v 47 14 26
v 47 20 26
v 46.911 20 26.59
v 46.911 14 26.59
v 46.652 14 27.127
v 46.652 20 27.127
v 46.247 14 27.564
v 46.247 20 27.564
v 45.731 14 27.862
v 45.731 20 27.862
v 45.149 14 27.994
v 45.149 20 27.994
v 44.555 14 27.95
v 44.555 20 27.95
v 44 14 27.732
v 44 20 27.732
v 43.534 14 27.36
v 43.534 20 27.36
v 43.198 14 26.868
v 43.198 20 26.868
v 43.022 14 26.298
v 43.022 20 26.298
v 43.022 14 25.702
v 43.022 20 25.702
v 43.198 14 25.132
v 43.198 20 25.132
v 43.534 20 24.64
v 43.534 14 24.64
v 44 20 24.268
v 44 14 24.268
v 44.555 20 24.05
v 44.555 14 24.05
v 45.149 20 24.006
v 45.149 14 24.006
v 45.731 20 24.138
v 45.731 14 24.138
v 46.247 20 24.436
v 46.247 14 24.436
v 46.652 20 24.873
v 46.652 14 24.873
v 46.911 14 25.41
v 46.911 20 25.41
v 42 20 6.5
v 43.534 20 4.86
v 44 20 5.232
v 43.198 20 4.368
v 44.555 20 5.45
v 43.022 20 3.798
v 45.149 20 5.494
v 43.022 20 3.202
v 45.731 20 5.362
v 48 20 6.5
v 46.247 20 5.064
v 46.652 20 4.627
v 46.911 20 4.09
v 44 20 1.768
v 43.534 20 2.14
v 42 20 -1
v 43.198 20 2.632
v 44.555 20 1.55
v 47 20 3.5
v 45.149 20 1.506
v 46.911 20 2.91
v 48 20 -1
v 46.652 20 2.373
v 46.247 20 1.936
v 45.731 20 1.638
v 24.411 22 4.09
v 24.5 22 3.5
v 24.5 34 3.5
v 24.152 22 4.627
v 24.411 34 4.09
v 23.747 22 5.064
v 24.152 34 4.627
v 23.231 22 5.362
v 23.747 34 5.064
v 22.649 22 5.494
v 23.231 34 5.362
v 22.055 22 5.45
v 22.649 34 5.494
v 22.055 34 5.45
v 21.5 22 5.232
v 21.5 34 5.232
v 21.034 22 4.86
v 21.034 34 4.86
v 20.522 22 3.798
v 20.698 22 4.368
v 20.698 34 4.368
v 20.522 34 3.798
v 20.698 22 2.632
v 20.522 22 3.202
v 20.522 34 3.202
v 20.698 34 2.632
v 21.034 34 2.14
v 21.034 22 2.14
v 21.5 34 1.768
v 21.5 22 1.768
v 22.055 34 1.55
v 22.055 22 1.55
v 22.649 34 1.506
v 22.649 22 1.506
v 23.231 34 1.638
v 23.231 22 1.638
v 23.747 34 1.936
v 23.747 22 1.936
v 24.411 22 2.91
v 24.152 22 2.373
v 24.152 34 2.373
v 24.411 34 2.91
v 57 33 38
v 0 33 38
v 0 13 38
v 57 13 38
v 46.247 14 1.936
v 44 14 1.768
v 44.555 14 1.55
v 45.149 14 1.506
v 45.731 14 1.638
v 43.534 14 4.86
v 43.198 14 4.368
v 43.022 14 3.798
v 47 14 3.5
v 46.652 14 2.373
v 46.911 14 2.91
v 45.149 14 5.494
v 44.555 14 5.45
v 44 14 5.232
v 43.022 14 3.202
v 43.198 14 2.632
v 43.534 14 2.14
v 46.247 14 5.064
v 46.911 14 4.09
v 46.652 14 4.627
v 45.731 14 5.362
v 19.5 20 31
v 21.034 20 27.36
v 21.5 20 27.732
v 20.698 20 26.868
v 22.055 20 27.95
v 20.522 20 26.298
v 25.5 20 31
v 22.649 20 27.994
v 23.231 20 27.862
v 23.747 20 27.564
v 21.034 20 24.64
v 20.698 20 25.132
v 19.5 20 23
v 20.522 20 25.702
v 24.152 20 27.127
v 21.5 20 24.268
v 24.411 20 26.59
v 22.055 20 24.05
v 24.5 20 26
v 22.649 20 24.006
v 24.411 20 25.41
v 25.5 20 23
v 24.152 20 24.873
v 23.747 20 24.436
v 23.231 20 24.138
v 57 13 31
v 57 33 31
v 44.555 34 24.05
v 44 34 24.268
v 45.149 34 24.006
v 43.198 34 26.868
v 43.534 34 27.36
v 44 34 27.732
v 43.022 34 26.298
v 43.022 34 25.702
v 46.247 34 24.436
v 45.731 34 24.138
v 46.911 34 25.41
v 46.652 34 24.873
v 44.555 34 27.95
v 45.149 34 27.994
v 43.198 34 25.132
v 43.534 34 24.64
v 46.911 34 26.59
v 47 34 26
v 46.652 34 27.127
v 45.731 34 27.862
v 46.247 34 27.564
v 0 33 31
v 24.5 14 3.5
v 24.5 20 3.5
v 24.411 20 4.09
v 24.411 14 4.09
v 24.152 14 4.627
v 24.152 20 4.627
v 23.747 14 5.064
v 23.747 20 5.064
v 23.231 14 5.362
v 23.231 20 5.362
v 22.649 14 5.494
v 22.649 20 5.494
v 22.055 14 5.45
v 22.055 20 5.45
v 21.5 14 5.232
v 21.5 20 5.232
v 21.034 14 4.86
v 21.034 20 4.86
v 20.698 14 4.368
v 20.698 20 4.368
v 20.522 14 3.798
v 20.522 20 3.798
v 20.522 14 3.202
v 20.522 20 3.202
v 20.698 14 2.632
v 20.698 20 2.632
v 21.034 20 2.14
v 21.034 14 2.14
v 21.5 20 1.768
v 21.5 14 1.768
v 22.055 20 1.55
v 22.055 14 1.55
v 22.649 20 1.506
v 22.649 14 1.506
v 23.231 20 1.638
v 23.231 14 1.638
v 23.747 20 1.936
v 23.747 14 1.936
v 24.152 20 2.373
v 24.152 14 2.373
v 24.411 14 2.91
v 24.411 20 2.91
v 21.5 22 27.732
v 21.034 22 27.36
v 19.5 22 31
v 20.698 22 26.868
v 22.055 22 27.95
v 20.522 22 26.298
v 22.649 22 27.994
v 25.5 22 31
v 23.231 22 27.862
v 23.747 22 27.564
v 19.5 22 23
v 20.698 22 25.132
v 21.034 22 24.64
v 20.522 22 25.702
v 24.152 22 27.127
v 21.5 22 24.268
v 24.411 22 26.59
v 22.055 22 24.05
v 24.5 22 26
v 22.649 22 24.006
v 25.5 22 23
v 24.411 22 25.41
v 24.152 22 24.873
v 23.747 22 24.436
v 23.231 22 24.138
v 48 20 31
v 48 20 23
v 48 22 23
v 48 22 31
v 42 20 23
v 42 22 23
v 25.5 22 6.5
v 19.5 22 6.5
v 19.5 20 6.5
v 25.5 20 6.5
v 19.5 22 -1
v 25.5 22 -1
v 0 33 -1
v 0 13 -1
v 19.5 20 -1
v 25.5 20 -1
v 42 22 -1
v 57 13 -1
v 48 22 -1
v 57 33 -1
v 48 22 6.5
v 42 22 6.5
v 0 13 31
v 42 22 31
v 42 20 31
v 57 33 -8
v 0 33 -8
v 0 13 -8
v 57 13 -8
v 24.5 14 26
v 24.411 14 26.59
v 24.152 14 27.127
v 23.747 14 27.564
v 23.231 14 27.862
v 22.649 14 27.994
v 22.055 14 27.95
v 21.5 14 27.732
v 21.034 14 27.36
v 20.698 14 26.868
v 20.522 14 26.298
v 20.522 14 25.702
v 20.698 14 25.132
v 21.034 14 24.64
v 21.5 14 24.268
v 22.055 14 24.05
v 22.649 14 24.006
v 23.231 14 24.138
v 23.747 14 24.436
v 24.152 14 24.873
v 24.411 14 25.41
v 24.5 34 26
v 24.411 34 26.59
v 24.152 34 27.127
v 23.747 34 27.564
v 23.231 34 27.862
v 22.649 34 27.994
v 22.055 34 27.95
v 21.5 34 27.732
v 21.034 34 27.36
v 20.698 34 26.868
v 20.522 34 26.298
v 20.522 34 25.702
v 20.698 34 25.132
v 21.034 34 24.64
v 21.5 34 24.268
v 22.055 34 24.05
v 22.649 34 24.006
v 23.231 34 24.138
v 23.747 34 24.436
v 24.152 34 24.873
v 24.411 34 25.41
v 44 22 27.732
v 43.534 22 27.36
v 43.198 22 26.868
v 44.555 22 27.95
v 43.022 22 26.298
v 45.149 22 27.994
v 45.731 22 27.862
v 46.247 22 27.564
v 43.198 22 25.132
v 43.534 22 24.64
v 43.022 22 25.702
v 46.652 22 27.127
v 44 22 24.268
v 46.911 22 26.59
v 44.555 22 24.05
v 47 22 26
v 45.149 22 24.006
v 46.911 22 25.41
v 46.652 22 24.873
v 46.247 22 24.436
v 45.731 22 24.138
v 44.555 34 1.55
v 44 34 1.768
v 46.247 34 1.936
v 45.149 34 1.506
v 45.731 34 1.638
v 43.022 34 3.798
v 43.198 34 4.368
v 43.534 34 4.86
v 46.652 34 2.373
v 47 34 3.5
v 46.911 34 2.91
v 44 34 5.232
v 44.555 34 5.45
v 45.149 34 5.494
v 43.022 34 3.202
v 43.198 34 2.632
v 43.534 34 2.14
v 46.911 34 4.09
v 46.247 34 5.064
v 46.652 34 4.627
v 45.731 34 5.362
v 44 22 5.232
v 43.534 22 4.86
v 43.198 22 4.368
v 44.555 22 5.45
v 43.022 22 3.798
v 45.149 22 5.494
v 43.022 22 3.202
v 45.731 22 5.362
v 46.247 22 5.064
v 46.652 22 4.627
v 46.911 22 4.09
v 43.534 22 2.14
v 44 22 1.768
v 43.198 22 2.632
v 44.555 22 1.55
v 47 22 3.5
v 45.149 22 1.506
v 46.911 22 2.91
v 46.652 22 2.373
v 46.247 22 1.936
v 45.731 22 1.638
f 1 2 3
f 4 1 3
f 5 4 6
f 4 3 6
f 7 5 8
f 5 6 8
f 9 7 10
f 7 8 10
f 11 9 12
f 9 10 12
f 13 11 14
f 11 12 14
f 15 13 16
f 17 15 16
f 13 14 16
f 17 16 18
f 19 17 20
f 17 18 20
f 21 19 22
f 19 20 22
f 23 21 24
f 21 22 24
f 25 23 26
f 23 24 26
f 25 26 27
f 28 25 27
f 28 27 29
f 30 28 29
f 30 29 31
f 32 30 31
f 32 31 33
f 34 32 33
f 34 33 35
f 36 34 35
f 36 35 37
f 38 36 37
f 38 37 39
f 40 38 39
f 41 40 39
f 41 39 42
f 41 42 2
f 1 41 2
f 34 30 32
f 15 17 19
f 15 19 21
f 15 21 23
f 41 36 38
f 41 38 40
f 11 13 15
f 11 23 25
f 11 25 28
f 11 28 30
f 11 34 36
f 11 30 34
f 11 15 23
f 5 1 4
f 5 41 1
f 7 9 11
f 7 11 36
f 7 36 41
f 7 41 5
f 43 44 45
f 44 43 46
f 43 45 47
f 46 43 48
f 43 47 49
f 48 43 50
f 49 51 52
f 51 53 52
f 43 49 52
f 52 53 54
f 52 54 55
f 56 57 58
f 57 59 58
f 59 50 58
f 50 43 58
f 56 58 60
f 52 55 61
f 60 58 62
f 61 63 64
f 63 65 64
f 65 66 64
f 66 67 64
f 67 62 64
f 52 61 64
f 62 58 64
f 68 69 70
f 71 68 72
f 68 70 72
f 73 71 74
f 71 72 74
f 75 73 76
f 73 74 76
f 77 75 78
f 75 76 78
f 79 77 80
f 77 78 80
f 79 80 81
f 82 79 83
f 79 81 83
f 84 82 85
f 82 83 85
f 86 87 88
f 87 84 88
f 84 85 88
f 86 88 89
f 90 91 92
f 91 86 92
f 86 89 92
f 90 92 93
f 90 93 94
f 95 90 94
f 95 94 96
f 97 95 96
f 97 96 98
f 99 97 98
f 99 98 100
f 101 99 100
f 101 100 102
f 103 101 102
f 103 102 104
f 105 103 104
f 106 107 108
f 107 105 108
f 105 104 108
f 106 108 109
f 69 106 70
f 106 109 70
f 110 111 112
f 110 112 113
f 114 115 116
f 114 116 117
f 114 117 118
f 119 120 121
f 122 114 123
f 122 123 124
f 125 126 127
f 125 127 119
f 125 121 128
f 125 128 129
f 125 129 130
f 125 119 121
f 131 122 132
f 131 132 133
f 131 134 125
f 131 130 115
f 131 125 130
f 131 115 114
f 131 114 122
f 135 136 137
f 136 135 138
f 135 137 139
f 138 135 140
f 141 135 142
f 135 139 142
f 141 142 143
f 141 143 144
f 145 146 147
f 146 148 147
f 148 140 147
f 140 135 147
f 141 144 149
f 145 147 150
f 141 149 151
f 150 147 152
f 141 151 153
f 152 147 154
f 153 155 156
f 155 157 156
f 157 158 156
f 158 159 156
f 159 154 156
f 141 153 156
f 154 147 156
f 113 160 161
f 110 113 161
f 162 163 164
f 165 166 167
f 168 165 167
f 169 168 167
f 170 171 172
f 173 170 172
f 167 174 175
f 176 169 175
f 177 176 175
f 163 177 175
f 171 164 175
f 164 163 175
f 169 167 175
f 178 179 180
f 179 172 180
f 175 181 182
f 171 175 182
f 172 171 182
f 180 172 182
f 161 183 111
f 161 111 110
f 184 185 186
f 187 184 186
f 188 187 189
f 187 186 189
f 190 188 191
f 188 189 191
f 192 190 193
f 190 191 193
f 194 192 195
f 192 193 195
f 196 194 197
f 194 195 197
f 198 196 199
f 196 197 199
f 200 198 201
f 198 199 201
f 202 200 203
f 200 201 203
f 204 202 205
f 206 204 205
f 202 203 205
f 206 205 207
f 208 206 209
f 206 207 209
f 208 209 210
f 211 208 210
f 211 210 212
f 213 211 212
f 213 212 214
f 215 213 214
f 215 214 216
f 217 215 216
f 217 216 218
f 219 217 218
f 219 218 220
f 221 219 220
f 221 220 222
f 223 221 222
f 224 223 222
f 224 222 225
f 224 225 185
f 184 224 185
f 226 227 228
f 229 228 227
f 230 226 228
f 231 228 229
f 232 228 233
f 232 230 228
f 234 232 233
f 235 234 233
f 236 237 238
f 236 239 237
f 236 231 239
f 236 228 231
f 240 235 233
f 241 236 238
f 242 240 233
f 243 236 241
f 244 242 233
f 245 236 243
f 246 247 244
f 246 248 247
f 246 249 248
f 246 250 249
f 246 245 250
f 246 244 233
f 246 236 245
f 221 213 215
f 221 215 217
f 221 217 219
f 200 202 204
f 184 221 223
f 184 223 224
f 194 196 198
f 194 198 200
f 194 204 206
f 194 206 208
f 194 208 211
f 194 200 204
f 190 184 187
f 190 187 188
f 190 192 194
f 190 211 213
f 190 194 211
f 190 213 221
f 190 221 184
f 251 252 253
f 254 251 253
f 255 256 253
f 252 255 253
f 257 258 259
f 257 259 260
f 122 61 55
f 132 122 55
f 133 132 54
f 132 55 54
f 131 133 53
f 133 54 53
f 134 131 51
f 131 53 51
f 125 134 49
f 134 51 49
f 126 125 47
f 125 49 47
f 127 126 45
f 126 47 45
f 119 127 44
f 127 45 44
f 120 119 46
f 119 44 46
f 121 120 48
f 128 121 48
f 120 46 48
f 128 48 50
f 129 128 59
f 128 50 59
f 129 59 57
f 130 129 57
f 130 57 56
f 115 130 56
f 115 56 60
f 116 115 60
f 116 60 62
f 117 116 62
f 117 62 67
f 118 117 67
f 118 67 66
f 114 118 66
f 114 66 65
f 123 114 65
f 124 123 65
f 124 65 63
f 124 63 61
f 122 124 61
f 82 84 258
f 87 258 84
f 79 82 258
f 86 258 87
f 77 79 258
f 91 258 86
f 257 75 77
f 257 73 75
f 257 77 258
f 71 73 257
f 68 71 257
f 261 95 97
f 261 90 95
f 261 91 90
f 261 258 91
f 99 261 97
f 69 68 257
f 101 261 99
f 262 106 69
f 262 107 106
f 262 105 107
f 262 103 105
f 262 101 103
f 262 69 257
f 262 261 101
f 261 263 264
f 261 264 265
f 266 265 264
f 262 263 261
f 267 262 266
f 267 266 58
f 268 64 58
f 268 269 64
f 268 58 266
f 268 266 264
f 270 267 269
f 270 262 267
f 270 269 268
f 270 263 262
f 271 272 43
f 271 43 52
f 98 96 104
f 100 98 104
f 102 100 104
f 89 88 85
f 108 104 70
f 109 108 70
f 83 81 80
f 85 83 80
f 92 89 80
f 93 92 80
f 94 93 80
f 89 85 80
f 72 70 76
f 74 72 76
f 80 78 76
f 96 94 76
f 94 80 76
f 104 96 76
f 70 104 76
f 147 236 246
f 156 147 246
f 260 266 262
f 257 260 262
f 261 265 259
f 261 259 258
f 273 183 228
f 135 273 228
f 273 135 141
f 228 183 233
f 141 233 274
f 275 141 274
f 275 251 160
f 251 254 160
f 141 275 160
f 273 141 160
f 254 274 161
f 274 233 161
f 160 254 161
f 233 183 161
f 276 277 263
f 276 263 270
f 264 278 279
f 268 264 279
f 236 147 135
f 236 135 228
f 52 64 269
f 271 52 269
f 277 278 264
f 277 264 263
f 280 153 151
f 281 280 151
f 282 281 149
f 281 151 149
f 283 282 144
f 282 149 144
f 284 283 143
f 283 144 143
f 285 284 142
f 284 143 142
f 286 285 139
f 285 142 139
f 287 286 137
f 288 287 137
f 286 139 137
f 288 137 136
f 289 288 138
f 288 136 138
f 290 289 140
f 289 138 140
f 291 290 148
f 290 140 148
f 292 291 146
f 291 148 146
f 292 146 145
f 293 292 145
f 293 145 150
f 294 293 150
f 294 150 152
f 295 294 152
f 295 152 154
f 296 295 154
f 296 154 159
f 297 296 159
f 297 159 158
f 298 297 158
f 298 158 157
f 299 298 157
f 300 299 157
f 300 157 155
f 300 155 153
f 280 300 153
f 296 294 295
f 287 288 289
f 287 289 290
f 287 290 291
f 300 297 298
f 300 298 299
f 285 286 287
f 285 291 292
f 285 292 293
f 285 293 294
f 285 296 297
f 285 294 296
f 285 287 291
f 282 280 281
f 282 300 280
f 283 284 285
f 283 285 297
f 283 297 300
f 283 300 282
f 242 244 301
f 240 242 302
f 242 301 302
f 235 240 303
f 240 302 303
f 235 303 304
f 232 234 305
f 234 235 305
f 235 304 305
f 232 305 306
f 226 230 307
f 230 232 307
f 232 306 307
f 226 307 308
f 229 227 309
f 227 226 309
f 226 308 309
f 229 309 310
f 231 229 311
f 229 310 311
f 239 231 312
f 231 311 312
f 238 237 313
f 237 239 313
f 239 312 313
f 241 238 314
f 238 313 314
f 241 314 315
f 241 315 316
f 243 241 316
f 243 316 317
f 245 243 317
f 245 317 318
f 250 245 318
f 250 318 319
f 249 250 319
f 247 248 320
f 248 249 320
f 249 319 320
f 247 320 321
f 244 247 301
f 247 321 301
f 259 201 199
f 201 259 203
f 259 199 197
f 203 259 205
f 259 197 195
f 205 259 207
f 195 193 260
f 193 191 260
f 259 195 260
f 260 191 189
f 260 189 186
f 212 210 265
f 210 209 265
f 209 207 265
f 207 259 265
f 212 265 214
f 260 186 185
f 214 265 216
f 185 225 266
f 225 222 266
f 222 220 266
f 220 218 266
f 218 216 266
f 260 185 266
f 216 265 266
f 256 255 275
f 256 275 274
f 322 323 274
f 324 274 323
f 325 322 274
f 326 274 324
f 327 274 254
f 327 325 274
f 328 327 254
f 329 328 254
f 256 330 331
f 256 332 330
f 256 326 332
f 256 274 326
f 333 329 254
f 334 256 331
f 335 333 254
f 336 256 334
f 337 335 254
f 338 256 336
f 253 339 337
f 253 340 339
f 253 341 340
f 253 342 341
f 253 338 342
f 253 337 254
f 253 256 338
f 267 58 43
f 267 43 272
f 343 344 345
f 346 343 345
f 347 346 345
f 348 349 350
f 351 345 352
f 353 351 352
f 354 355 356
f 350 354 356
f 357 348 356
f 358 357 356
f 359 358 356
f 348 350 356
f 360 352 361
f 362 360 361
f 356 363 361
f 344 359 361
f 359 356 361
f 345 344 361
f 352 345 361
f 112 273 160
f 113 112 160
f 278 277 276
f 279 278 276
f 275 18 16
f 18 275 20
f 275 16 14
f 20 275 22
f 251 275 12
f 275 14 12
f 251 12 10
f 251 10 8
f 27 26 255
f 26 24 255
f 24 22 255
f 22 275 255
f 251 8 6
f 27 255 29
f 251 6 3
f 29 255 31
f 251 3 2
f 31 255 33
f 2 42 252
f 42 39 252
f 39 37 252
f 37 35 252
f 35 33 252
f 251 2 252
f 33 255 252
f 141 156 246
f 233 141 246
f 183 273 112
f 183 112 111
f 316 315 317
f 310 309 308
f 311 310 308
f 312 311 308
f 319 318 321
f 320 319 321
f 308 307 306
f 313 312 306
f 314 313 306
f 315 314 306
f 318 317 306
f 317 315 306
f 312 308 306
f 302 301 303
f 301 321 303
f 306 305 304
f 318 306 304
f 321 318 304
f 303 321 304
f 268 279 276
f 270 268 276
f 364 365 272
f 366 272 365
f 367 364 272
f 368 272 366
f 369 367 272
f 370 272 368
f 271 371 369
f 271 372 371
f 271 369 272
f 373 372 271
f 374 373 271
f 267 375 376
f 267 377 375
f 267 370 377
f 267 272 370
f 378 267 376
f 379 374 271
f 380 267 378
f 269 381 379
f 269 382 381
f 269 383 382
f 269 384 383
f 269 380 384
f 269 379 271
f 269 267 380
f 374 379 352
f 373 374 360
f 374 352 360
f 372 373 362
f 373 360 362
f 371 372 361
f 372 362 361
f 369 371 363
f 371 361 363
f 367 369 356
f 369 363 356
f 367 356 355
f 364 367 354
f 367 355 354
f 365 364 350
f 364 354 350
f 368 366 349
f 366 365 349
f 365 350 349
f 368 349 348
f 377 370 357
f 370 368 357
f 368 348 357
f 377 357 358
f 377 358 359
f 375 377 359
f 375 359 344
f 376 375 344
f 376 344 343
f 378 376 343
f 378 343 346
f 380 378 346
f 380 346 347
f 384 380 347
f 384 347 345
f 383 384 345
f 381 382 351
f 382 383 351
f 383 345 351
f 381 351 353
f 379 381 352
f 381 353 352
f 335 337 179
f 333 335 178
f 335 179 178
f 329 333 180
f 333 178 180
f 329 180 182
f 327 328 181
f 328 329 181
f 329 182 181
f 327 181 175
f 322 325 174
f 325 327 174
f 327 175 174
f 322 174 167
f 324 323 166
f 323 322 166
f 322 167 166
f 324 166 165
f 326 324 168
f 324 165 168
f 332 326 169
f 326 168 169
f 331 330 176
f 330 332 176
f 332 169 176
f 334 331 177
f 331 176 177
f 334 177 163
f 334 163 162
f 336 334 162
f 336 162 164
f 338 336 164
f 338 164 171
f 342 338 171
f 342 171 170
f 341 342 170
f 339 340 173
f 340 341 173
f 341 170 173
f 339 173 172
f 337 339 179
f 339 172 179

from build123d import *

# Parameters (mm, degrees)
BOX052_W                = 57
BOX052_H                = 20
BOX052_DEPTH            = 7
BOX051_W                = 57
BOX051_H                = 20
BOX051_DEPTH            = 7
BOX048_W                = 6
BOX048_H                = 2
BOX048_DEPTH            = 12
BOX049_W                = 6
BOX049_H                = 2
BOX049_DEPTH            = 12
BOX050_W                = 6
BOX050_H                = 2
BOX050_DEPTH            = 12
BOX047_W                = 6
BOX047_H                = 2
BOX047_DEPTH            = 12
CYLINDER086_R           = 2
CYLINDER086_DEPTH       = 20
CYLINDER087_R           = 2
CYLINDER087_DEPTH       = 20
CYLINDER085_R           = 2
CYLINDER085_DEPTH       = 20
CYLINDER084_R           = 2
CYLINDER084_DEPTH       = 20
FUSION026029_ROLL_ANGLE = 90


with BuildPart() as w_rfel051:
    # Box052 → Box052 (new body)
    with BuildSketch(Plane(origin=(0, 13, 31), x_dir=(1, 0, 0), z_dir=(0, 0, 1))):
        with Locations((28.5, 10)):
            Rectangle(BOX052_W, BOX052_H)
    extrude(amount=BOX052_DEPTH)


with BuildPart() as sidecut:
    # Box051 → Box051 (new body)
    with BuildSketch(Plane(origin=(0, 13, -8), x_dir=(1, 0, 0), z_dir=(0, 0, 1))):
        with Locations((28.5, 10)):
            Rectangle(BOX051_W, BOX051_H)
    extrude(amount=BOX051_DEPTH)

    # Fusion026036: union Würfel051
    add(w_rfel051.part)


with BuildPart() as w_rfel047:
    # Box048 → Box048 (new body)
    with BuildSketch(Plane(origin=(42, -4, -5.5), x_dir=(1, 0, 0), z_dir=(0, 0, 1))):
        with Locations((3, 1)):
            Rectangle(BOX048_W, BOX048_H)
    extrude(amount=BOX048_DEPTH)


with BuildPart() as w_rfel048:
    # Box049 → Box049 (new body)
    with BuildSketch(Plane(origin=(19.5, -4, -5.5), x_dir=(1, 0, 0), z_dir=(0, 0, 1))):
        with Locations((3, 1)):
            Rectangle(BOX049_W, BOX049_H)
    extrude(amount=BOX049_DEPTH)


with BuildPart() as w_rfel049:
    # Box050 → Box050 (new body)
    with BuildSketch(Plane(origin=(42, -4, 23), x_dir=(1, 0, 0), z_dir=(0, 0, 1))):
        with Locations((3, 1)):
            Rectangle(BOX050_W, BOX050_H)
    extrude(amount=BOX050_DEPTH)


with BuildPart() as mutterschlitz:
    # Box047 → Box047 (new body)
    with BuildSketch(Plane(origin=(19.5, -4, 23), x_dir=(1, 0, 0), z_dir=(0, 0, 1))):
        with Locations((3, 1)):
            Rectangle(BOX047_W, BOX047_H)
    extrude(amount=BOX047_DEPTH)

    # Fusion026034: union Würfel047, Würfel048, Würfel049
    add(w_rfel047.part)
    add(w_rfel048.part)
    add(w_rfel049.part)


with BuildPart() as zylinder077:
    # Cylinder086 → Cylinder086 (new body)
    with BuildSketch(Plane(origin=(19, 14, 0), x_dir=(1, 0, 0), z_dir=(0, 0, 1))):
        Circle(CYLINDER086_R)
    extrude(amount=CYLINDER086_DEPTH)


with BuildPart() as zylinder078:
    # Cylinder087 → Cylinder087 (new body)
    with BuildSketch(Plane(origin=(19, 36.5, 0), x_dir=(1, 0, 0), z_dir=(0, 0, 1))):
        Circle(CYLINDER087_R)
    extrude(amount=CYLINDER087_DEPTH)


with BuildPart() as zylinder076:
    # Cylinder085 → Cylinder085 (new body)
    with BuildSketch(Plane(origin=(-3.5, 36.5, 0), x_dir=(1, 0, 0), z_dir=(0, 0, 1))):
        Circle(CYLINDER085_R)
    extrude(amount=CYLINDER085_DEPTH)


with BuildPart() as fullcut:
    # Cylinder084 → Cylinder084 (new body)
    with BuildSketch(Plane(origin=(-3.5, 14, 0), x_dir=(1, 0, 0), z_dir=(0, 0, 1))):
        Circle(CYLINDER084_R)
    extrude(amount=CYLINDER084_DEPTH)

    # Fusion026029: union Zylinder077, Zylinder078, Zylinder076
    add(zylinder077.part)
    add(zylinder078.part)
    add(zylinder076.part)


with BuildPart() as fullcut_1:
    # Fusion026029 roll: moved
    add(fullcut.part.rotate(Axis((0, 0, 0), (1, 0, 0)), FUSION026029_ROLL_ANGLE))


with BuildPart() as fullcut_2:
    # Fusion026029 placement: moved
    add(fullcut_1.part.moved(Location((26, 10, -10.5))))

    # Fusion026035: union MutterSchlitz
    add(mutterschlitz.part)


with BuildPart() as fullcut_3:
    # Fusion026035 placement: moved
    add(fullcut_2.part.moved(Location((0, 24, 0))))

    # Fusion026037: union SideCut
    add(sidecut.part)


solid = fullcut_3.part
